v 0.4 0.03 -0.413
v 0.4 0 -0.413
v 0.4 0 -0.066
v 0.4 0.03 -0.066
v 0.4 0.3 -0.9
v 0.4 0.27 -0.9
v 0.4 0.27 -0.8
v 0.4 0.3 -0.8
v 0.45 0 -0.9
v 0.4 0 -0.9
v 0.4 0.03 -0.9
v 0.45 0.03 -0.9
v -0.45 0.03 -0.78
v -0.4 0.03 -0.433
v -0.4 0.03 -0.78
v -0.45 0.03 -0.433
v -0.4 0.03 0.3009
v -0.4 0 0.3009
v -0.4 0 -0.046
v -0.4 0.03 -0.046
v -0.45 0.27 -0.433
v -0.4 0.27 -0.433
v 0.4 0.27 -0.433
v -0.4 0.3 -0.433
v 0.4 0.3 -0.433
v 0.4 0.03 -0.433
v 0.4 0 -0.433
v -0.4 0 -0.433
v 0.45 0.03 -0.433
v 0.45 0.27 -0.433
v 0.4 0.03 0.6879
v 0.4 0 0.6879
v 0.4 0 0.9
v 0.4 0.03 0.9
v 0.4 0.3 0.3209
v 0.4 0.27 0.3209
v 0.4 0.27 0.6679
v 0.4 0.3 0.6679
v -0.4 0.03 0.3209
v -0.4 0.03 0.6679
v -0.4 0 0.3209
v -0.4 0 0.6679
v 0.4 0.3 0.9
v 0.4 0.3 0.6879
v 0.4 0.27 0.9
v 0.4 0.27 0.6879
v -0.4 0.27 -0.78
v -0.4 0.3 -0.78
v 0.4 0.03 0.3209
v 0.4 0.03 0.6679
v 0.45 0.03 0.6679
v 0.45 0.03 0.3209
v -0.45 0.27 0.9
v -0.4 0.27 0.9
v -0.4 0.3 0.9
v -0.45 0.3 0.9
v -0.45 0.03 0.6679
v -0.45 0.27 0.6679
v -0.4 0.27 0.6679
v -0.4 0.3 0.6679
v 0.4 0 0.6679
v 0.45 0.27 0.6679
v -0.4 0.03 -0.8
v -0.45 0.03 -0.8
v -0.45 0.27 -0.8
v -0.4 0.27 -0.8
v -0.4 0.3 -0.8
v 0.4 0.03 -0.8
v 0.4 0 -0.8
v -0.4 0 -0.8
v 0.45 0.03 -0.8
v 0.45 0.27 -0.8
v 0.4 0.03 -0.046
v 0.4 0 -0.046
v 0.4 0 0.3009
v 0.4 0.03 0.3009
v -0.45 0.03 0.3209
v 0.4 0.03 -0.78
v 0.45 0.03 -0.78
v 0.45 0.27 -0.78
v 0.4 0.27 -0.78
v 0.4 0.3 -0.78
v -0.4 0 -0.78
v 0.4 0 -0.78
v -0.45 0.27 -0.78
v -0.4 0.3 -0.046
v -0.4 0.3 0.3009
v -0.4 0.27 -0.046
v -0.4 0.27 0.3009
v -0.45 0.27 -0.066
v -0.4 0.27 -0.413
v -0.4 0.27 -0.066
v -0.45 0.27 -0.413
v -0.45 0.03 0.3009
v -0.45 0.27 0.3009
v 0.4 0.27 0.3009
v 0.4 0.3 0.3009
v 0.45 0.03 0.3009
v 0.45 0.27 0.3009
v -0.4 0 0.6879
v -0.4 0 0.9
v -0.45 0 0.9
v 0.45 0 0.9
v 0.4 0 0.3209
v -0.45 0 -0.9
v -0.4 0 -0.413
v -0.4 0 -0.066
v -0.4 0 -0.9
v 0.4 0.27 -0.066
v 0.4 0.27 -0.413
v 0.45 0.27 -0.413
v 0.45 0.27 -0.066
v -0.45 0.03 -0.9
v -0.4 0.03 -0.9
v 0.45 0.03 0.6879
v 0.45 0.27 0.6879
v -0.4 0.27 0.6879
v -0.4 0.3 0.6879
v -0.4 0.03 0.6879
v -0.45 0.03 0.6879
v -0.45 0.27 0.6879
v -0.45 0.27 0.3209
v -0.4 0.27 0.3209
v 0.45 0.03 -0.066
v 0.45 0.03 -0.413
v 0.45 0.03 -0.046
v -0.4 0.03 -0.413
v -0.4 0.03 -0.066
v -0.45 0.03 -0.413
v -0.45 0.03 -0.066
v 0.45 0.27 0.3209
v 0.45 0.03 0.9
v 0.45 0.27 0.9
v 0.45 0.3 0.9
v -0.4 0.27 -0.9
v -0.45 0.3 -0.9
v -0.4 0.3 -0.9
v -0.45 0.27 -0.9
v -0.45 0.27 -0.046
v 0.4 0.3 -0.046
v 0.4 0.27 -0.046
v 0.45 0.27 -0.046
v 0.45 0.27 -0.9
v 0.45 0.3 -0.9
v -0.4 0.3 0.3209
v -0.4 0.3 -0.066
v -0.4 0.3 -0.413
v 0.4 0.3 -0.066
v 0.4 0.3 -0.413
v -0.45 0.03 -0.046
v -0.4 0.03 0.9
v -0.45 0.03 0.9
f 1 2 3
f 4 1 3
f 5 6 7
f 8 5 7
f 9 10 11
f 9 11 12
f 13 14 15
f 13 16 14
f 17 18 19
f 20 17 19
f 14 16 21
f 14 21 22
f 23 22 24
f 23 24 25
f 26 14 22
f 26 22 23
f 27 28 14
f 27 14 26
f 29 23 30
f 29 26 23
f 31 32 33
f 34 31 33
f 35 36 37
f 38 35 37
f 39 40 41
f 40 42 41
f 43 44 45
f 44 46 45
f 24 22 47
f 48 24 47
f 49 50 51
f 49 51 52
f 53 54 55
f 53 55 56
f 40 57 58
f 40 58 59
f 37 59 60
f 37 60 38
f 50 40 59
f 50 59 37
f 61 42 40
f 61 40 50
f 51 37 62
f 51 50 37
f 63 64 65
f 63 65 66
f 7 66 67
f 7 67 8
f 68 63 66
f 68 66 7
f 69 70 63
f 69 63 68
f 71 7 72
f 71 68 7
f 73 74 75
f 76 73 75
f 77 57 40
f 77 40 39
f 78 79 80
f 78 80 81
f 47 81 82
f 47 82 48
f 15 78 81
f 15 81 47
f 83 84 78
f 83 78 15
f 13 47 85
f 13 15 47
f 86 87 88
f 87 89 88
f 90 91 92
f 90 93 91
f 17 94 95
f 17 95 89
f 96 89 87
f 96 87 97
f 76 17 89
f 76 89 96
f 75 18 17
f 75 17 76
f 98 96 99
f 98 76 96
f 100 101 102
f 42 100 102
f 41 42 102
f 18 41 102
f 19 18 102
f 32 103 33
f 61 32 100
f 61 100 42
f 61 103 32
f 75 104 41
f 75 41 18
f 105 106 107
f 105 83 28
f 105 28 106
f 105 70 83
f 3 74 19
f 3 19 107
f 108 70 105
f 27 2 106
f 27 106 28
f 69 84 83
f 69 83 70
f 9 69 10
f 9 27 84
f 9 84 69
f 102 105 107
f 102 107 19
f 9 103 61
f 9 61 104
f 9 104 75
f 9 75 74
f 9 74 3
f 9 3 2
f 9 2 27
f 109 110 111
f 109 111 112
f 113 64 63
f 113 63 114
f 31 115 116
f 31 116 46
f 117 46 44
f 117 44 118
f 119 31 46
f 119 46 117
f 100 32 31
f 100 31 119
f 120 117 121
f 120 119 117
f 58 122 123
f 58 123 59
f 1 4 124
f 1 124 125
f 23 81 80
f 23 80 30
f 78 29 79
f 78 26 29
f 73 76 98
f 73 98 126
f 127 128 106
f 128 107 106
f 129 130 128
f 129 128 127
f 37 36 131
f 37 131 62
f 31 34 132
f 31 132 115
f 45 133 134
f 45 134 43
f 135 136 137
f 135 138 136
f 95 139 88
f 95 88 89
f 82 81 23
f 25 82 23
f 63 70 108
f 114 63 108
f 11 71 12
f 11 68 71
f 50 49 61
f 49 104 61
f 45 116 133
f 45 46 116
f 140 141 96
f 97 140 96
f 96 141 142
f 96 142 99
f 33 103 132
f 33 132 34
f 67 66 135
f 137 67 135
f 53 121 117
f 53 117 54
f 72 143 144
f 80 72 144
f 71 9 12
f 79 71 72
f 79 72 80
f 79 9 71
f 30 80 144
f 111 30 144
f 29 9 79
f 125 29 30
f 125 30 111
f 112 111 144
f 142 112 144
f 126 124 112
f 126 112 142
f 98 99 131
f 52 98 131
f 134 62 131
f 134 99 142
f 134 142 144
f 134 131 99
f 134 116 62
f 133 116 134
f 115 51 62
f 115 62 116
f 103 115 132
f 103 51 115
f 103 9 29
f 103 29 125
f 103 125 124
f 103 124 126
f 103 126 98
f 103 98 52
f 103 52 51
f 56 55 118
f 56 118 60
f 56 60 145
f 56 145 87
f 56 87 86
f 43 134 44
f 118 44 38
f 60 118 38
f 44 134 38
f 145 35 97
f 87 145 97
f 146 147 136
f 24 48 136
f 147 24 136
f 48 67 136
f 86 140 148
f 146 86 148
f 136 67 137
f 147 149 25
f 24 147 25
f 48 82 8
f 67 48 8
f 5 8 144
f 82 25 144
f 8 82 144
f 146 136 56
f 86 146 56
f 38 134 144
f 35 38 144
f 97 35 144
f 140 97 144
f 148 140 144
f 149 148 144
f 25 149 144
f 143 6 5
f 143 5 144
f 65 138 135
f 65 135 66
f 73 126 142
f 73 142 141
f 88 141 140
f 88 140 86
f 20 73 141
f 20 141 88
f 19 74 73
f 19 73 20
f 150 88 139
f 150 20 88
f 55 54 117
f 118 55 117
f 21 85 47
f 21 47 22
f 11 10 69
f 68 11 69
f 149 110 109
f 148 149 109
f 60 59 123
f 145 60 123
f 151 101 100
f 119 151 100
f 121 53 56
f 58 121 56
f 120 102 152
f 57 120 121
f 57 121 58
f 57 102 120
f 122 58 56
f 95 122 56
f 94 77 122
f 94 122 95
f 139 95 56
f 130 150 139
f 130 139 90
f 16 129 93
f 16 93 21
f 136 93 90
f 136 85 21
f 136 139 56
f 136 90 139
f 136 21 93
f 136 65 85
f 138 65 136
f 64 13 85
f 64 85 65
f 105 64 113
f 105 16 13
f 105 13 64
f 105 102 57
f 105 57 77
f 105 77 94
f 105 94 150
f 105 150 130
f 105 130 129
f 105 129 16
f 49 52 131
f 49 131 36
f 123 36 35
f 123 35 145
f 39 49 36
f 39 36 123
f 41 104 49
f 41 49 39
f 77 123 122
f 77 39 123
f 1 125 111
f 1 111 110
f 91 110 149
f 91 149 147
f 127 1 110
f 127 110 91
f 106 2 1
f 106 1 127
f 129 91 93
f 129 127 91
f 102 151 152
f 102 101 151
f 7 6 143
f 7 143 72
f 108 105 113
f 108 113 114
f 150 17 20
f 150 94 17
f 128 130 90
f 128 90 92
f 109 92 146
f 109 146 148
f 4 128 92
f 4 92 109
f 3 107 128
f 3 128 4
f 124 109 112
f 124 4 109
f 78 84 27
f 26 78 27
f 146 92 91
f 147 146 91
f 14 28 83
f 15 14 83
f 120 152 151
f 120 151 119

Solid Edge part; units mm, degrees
sketch "Sketch1" plane through (0, 0, 0) normal (0, -1, 0) x (1, 0, 0)
  line L0 (-0.4, 0.6679) -> (0.4, 0.6679)
  line L1 (0.4, 0.3209) -> (0.4, 0.6679)
  line L2 (0.4, 0.3209) -> (-0.4, 0.3209)
  line L3 (-0.4, 0.6679) -> (-0.4, 0.3209)
  line L4 (-0.4, 0.3009) -> (0.4, 0.3009)
  line L5 (0.4, -0.046) -> (0.4, 0.3009)
  line L6 (0.4, -0.046) -> (-0.4, -0.046)
  line L7 (-0.4, 0.3009) -> (-0.4, -0.046)
  line L8 (-0.4, -0.066) -> (0.4, -0.066)
  line L9 (0.4, -0.413) -> (0.4, -0.066)
  line L10 (0.4, -0.413) -> (-0.4, -0.413)
  line L11 (-0.4, -0.066) -> (-0.4, -0.413)
  line L12 (-0.4, -0.433) -> (0.4, -0.433)
  line L13 (0.4, -0.78) -> (0.4, -0.433)
  line L14 (0.4, -0.78) -> (-0.4, -0.78)
  line L15 (-0.4, -0.433) -> (-0.4, -0.78)
  line L16 (0.4, -0.9) -> (0.45, -0.9)
  line L17 (0.45, -0.9) -> (0.45, 0.9)
  line L18 (0.45, 0.9) -> (0.4, 0.9)
  line L19 (0.4, 0.6879) -> (0.4, 0.9)
  line L20 (0.4, 0.6879) -> (-0.4, 0.6879)
  line L21 (-0.4, 0.9) -> (-0.4, 0.6879)
  line L22 (-0.4, 0.9) -> (-0.45, 0.9)
  line L23 (-0.45, 0.9) -> (-0.45, -0.9)
  line L24 (-0.45, -0.9) -> (-0.4, -0.9)
  line L25 (-0.4, -0.8) -> (-0.4, -0.9)
  line L26 (-0.4, -0.8) -> (0.4, -0.8)
  line L27 (0.4, -0.9) -> (0.4, -0.8)
  dimension "D1" = 0.05
  dimension "D2" = 1.8
  dimension "D3" = 0.9
  dimension "D4" = 0.02
  dimension "D5" = 0.347
  dimension "D6" = 0.1
extrude "Protrusion1" add sketch "Sketch1" against normal blind 0.3
sketch "Sketch2" plane through (-0.45, 0.15, 0) normal (-1, 0, 0) x (0, 0, -1)
  line L0 (-0.6679, -0.12) -> (-0.6679, 0.12)
  line L1 (-0.6679, 0.12) -> (-0.3209, 0.12)
  line L2 (-0.3209, -0.12) -> (-0.3209, 0.12)
  line L3 (-0.3209, -0.12) -> (-0.6679, -0.12)
  line L4 (-0.3009, -0.12) -> (-0.3009, 0.12)
  line L5 (-0.3009, 0.12) -> (0.046, 0.12)
  line L6 (0.046, -0.12) -> (0.046, 0.12)
  line L7 (0.046, -0.12) -> (-0.3009, -0.12)
  line L8 (0.066, -0.12) -> (0.066, 0.12)
  line L9 (0.066, 0.12) -> (0.413, 0.12)
  line L10 (0.413, -0.12) -> (0.413, 0.12)
  line L11 (0.413, -0.12) -> (0.066, -0.12)
  line L12 (0.433, -0.12) -> (0.433, 0.12)
  line L13 (0.433, 0.12) -> (0.78, 0.12)
  line L14 (0.78, -0.12) -> (0.78, 0.12)
  line L15 (0.78, -0.12) -> (0.433, -0.12)
  line L16 (0.8, -0.12) -> (0.8, 0.12)
  line L17 (0.8, 0.12) -> (0.9, 0.12)
  line L18 (0.9, -0.12) -> (0.9, 0.12)
  line L19 (0.9, -0.12) -> (0.8, -0.12)
  line L20 (-0.6879, -0.12) -> (-0.6879, 0.12)
  line L21 (-0.9, 0.12) -> (-0.6879, 0.12)
  line L22 (-0.9, -0.12) -> (-0.9, 0.12)
  line L23 (-0.6879, -0.12) -> (-0.9, -0.12)
  dimension "D1" = 0.03
extrude "Cutout1" cut sketch "Sketch2" against normal through all
